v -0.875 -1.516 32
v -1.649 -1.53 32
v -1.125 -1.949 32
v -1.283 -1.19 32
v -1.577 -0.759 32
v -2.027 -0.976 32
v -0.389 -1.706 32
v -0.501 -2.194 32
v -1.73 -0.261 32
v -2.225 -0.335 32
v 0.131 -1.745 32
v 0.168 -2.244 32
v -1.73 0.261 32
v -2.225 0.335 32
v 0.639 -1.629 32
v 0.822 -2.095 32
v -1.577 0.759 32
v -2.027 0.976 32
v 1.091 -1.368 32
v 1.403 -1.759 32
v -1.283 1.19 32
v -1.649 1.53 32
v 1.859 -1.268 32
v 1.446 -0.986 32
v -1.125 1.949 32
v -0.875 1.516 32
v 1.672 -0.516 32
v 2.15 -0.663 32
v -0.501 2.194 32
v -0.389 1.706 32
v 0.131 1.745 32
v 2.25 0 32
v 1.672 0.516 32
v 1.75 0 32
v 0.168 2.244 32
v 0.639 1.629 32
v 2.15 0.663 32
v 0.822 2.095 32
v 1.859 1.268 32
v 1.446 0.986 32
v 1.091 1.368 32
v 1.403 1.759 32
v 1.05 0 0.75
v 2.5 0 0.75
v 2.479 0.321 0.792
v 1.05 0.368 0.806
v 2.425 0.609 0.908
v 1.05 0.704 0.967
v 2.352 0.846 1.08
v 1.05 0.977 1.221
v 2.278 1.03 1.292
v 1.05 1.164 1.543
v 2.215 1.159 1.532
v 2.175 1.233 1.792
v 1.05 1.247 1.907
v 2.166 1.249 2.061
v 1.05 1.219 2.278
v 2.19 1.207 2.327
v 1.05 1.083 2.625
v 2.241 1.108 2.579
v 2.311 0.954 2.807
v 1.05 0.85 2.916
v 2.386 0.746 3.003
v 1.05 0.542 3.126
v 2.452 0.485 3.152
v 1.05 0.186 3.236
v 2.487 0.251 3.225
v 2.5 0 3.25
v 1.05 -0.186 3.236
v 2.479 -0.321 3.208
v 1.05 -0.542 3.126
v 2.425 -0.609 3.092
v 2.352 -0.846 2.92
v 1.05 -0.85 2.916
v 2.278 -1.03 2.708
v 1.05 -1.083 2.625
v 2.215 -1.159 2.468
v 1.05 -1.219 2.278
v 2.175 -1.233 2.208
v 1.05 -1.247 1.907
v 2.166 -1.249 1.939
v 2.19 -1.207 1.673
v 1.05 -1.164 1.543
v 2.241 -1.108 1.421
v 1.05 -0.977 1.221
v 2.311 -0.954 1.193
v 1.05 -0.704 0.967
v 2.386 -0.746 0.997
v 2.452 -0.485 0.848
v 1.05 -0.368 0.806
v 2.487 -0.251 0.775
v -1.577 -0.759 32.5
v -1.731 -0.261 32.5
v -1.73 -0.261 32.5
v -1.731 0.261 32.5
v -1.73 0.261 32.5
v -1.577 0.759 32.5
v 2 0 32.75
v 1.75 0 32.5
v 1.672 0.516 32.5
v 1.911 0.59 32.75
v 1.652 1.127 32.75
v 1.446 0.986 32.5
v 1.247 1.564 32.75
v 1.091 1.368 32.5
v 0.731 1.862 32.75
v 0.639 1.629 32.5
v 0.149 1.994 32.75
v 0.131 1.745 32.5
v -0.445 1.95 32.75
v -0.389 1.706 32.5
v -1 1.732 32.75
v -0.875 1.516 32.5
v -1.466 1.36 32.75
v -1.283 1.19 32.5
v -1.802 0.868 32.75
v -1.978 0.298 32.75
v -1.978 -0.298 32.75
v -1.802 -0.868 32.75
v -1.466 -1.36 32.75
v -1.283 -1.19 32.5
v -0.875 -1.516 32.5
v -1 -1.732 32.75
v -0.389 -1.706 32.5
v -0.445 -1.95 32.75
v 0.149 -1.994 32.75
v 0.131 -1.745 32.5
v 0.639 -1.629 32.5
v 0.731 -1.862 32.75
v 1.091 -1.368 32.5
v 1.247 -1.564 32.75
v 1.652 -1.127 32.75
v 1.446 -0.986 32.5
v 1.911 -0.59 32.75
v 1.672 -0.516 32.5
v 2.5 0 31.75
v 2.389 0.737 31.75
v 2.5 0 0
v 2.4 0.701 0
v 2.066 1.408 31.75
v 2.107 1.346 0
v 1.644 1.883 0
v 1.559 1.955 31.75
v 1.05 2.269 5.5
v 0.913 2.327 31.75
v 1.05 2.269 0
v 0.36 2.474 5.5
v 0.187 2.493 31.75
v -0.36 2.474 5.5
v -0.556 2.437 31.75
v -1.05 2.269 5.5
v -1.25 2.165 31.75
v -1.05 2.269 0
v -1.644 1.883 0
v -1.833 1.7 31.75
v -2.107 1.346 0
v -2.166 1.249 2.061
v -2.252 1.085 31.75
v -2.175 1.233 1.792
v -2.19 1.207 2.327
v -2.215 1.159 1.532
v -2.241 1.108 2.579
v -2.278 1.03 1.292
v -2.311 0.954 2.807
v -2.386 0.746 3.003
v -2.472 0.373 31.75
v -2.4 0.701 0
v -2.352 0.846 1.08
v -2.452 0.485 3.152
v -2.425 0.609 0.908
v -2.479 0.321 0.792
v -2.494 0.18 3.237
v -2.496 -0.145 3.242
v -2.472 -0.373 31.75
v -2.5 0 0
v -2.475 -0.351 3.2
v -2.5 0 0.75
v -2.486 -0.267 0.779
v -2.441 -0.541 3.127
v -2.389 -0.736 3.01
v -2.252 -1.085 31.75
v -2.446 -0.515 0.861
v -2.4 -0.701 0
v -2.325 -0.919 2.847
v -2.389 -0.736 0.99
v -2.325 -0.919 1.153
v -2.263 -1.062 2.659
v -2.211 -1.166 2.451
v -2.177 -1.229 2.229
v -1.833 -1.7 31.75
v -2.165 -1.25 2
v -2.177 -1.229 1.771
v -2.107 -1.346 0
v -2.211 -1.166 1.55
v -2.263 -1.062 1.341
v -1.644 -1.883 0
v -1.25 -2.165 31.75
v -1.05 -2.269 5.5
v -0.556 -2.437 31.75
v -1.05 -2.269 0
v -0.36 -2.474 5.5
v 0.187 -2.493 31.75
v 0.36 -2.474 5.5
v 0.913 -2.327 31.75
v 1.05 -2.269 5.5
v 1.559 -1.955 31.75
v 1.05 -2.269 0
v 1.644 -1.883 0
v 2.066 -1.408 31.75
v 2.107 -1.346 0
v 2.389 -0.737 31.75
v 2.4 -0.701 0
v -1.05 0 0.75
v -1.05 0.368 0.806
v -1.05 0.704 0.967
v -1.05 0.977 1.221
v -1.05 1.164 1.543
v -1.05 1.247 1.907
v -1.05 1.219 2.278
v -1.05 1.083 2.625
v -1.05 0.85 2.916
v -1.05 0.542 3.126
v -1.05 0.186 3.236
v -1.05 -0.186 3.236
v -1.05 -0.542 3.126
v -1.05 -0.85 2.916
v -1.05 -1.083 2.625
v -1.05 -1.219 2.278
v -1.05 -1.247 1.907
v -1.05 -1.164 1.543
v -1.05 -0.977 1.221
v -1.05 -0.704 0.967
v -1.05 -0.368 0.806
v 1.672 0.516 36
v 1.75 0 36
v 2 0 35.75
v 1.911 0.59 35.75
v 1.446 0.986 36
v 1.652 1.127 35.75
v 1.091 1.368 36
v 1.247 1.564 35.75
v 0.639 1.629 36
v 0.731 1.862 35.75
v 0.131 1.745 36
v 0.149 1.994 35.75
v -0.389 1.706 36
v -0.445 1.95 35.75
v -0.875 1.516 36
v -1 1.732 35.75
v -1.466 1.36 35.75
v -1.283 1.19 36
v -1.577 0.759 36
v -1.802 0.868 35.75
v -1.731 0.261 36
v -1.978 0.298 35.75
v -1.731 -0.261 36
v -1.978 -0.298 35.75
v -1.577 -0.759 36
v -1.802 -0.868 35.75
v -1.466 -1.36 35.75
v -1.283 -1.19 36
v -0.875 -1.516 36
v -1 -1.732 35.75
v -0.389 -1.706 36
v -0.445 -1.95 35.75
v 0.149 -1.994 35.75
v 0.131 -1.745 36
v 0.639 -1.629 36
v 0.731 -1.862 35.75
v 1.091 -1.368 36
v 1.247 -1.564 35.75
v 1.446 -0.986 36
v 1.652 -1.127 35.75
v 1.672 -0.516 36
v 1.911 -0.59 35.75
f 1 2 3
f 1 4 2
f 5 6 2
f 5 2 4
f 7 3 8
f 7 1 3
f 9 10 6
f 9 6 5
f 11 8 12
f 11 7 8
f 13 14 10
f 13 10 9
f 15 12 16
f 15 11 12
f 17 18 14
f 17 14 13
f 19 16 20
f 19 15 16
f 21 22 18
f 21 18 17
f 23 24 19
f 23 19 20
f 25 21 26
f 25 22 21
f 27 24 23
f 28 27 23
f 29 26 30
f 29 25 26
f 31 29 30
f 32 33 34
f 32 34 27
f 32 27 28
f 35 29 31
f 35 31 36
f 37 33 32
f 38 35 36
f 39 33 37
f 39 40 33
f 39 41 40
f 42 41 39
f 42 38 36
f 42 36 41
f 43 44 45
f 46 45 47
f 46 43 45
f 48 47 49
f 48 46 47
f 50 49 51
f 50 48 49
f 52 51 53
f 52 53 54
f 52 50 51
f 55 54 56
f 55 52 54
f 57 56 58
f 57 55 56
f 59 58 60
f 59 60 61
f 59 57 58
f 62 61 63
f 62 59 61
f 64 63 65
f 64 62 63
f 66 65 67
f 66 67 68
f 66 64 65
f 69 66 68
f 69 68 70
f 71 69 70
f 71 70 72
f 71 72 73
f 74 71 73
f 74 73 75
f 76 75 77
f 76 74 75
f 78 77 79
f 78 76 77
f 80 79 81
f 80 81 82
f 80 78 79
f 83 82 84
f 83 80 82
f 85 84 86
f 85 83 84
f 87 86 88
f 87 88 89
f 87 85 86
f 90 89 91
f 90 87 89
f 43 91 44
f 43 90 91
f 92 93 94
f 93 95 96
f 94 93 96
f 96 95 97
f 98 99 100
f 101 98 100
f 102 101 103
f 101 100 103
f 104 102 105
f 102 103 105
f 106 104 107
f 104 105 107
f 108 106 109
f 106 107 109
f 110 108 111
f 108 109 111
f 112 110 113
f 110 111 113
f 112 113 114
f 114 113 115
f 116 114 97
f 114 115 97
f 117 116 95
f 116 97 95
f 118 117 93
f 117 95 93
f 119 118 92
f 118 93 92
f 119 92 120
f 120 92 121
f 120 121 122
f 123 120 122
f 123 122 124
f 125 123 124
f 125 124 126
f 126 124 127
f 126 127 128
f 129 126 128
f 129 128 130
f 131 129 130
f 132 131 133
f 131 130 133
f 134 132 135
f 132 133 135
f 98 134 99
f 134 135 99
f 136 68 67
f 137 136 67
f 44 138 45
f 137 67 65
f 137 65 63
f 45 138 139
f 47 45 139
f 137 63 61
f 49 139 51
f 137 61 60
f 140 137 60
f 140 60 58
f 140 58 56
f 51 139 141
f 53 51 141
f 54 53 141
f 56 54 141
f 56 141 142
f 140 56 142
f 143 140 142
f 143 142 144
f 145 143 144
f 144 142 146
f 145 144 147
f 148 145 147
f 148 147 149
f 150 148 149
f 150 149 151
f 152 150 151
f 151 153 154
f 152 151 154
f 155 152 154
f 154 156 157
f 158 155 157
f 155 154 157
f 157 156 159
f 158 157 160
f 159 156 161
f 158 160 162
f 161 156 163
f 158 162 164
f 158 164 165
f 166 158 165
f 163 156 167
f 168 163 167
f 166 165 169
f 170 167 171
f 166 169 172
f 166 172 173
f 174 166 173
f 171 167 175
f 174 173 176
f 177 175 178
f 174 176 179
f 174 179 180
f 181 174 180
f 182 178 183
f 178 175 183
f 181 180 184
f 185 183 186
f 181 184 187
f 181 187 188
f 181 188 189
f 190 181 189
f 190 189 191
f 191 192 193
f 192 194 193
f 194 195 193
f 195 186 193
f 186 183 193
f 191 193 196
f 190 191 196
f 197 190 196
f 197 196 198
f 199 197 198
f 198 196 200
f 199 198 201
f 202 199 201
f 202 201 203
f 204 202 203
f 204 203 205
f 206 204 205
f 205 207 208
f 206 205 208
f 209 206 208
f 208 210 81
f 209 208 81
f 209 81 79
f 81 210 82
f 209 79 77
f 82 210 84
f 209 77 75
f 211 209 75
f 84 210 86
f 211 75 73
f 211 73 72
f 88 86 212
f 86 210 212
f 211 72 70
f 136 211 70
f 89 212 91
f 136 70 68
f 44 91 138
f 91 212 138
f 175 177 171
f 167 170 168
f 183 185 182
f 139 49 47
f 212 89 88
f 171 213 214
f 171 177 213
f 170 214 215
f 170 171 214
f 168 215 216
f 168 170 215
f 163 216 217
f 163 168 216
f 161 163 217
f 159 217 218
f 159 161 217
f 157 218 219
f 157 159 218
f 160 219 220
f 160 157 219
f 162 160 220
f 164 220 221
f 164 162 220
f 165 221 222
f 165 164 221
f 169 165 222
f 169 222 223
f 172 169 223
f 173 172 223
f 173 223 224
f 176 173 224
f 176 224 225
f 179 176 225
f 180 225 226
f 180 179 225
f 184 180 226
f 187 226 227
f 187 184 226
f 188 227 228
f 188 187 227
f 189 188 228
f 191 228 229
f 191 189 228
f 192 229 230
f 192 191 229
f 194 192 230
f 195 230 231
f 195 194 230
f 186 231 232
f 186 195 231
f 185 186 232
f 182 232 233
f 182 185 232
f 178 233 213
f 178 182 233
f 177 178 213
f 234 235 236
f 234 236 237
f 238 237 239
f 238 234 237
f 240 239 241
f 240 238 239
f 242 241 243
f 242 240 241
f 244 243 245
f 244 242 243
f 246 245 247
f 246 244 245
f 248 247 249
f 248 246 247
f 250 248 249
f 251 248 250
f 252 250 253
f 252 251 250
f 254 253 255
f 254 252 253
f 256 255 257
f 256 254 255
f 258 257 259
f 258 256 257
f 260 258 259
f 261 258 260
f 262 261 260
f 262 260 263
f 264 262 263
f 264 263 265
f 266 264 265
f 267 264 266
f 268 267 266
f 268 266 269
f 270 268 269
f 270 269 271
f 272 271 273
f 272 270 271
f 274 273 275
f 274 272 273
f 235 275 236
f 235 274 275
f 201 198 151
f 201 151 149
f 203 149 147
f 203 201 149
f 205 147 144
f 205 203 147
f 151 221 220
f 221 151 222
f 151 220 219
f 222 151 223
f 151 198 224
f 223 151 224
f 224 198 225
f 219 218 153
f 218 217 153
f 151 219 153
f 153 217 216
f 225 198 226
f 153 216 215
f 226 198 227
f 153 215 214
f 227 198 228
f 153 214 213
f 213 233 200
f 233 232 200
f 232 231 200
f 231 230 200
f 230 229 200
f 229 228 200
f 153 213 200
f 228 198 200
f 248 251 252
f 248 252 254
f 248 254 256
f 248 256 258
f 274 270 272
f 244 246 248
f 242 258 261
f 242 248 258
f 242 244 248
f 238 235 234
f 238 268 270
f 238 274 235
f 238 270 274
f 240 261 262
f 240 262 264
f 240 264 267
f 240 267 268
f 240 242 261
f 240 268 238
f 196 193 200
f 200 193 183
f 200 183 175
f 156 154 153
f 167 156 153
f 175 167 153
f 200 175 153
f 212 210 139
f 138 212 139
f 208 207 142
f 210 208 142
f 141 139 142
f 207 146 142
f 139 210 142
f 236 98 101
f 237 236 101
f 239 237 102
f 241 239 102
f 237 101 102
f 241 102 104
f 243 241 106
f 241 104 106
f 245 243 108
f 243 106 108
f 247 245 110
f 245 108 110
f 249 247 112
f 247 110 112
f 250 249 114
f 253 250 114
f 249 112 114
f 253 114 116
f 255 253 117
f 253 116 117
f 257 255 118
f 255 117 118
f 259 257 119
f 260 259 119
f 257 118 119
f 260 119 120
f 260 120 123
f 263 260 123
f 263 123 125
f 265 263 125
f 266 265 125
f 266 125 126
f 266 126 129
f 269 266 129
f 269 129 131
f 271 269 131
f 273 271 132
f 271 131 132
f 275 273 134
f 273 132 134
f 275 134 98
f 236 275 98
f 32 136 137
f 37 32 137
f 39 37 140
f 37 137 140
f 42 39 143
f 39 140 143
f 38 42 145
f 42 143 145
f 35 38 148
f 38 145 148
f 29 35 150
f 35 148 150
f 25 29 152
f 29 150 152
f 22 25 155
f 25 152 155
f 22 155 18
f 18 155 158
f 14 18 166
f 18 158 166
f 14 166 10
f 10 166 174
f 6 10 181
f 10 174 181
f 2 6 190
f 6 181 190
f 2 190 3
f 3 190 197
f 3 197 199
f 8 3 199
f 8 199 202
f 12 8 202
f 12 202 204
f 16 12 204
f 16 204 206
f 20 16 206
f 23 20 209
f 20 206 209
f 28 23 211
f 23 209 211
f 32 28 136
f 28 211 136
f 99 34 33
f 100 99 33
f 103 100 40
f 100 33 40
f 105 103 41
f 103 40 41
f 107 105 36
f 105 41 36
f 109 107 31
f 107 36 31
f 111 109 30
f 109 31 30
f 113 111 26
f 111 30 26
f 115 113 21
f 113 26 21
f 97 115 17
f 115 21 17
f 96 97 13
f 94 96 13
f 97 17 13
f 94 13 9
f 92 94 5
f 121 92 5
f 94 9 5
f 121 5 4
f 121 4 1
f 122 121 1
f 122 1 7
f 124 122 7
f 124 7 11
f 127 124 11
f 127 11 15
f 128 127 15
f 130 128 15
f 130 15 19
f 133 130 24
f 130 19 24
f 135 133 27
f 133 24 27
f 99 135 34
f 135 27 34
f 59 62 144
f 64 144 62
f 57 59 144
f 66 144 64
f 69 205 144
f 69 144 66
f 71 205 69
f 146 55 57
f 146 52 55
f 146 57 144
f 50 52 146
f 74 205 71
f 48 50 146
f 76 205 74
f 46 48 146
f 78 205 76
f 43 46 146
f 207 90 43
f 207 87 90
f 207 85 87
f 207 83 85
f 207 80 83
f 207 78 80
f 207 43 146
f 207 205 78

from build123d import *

# Parameters (mm, degrees)
SKETCH1_R               = 2.5
BOSS_EXTRUDE1_DEPTH     = 32
SKETCH2_R               = 1.75
BOSS_EXTRUDE2_DEPTH     = 0.5
SKETCH4_R               = 2
BOSS_EXTRUDE3_DEPTH     = 3.5
CHAMFER1_SIZE           = 0.25
CUT_EXTRUDE1_DEPTH      = 37.173194495
CUT_EXTRUDE1_DEPTH_BACK = 37.173194495
SKETCH5_R               = 1.25
CUT_EXTRUDE2_DEPTH      = 37.173194509
CUT_EXTRUDE2_DEPTH_BACK = 37.173194509
SKETCH6_W               = 2.1
SKETCH6_H               = 5.5


with BuildPart() as part:
    # Sketch1 → Boss-Extrude1 (new body)
    with BuildSketch(Plane.XY):
        Circle(SKETCH1_R)
    extrude(amount=BOSS_EXTRUDE1_DEPTH)

    # Sketch2 → Boss-Extrude2 (add)
    with BuildSketch(Plane.XY.offset(32)):
        Circle(SKETCH2_R)
    extrude(amount=BOSS_EXTRUDE2_DEPTH)

    # Sketch4 → Boss-Extrude3 (add)
    with BuildSketch(Plane.XY.offset(32.5)):
        Circle(SKETCH4_R)
    extrude(amount=BOSS_EXTRUDE3_DEPTH)

    # Chamfer1
    chamfer1_edges = [part.edges().sort_by_distance(p)[0] for p in [
        (-2, 0, 32.5),
        (-2, 0, 36),
        (-2.5, 0, 32),
    ]]
    chamfer(chamfer1_edges, length=CHAMFER1_SIZE - 0.0001)  # a hair under: the kernel refuses the full size

    # Sketch5 → Cut-Extrude1 (cut, two sides: drawn at the far end of the back side and taken through both)
    with BuildSketch(Plane(origin=(0, 0, 0), x_dir=(0, 0, -1), z_dir=(1, 0, 0)).offset(-CUT_EXTRUDE1_DEPTH_BACK)):
        with Locations((-2, 0)):
            Circle(SKETCH5_R)
    extrude(amount=CUT_EXTRUDE1_DEPTH + CUT_EXTRUDE1_DEPTH_BACK, mode=Mode.SUBTRACT)

    # Sketch6 → Cut-Extrude2 (cut, two sides: drawn at the far end of the back side and taken through both)
    with BuildSketch(Plane(origin=(0, 0, 0), x_dir=(1, 0, 0), z_dir=(0, 1, 0)).offset(-CUT_EXTRUDE2_DEPTH_BACK)):
        with Locations((0, -2.75)):
            Rectangle(SKETCH6_W, SKETCH6_H)
    extrude(amount=CUT_EXTRUDE2_DEPTH + CUT_EXTRUDE2_DEPTH_BACK, mode=Mode.SUBTRACT)


solid = part.part
